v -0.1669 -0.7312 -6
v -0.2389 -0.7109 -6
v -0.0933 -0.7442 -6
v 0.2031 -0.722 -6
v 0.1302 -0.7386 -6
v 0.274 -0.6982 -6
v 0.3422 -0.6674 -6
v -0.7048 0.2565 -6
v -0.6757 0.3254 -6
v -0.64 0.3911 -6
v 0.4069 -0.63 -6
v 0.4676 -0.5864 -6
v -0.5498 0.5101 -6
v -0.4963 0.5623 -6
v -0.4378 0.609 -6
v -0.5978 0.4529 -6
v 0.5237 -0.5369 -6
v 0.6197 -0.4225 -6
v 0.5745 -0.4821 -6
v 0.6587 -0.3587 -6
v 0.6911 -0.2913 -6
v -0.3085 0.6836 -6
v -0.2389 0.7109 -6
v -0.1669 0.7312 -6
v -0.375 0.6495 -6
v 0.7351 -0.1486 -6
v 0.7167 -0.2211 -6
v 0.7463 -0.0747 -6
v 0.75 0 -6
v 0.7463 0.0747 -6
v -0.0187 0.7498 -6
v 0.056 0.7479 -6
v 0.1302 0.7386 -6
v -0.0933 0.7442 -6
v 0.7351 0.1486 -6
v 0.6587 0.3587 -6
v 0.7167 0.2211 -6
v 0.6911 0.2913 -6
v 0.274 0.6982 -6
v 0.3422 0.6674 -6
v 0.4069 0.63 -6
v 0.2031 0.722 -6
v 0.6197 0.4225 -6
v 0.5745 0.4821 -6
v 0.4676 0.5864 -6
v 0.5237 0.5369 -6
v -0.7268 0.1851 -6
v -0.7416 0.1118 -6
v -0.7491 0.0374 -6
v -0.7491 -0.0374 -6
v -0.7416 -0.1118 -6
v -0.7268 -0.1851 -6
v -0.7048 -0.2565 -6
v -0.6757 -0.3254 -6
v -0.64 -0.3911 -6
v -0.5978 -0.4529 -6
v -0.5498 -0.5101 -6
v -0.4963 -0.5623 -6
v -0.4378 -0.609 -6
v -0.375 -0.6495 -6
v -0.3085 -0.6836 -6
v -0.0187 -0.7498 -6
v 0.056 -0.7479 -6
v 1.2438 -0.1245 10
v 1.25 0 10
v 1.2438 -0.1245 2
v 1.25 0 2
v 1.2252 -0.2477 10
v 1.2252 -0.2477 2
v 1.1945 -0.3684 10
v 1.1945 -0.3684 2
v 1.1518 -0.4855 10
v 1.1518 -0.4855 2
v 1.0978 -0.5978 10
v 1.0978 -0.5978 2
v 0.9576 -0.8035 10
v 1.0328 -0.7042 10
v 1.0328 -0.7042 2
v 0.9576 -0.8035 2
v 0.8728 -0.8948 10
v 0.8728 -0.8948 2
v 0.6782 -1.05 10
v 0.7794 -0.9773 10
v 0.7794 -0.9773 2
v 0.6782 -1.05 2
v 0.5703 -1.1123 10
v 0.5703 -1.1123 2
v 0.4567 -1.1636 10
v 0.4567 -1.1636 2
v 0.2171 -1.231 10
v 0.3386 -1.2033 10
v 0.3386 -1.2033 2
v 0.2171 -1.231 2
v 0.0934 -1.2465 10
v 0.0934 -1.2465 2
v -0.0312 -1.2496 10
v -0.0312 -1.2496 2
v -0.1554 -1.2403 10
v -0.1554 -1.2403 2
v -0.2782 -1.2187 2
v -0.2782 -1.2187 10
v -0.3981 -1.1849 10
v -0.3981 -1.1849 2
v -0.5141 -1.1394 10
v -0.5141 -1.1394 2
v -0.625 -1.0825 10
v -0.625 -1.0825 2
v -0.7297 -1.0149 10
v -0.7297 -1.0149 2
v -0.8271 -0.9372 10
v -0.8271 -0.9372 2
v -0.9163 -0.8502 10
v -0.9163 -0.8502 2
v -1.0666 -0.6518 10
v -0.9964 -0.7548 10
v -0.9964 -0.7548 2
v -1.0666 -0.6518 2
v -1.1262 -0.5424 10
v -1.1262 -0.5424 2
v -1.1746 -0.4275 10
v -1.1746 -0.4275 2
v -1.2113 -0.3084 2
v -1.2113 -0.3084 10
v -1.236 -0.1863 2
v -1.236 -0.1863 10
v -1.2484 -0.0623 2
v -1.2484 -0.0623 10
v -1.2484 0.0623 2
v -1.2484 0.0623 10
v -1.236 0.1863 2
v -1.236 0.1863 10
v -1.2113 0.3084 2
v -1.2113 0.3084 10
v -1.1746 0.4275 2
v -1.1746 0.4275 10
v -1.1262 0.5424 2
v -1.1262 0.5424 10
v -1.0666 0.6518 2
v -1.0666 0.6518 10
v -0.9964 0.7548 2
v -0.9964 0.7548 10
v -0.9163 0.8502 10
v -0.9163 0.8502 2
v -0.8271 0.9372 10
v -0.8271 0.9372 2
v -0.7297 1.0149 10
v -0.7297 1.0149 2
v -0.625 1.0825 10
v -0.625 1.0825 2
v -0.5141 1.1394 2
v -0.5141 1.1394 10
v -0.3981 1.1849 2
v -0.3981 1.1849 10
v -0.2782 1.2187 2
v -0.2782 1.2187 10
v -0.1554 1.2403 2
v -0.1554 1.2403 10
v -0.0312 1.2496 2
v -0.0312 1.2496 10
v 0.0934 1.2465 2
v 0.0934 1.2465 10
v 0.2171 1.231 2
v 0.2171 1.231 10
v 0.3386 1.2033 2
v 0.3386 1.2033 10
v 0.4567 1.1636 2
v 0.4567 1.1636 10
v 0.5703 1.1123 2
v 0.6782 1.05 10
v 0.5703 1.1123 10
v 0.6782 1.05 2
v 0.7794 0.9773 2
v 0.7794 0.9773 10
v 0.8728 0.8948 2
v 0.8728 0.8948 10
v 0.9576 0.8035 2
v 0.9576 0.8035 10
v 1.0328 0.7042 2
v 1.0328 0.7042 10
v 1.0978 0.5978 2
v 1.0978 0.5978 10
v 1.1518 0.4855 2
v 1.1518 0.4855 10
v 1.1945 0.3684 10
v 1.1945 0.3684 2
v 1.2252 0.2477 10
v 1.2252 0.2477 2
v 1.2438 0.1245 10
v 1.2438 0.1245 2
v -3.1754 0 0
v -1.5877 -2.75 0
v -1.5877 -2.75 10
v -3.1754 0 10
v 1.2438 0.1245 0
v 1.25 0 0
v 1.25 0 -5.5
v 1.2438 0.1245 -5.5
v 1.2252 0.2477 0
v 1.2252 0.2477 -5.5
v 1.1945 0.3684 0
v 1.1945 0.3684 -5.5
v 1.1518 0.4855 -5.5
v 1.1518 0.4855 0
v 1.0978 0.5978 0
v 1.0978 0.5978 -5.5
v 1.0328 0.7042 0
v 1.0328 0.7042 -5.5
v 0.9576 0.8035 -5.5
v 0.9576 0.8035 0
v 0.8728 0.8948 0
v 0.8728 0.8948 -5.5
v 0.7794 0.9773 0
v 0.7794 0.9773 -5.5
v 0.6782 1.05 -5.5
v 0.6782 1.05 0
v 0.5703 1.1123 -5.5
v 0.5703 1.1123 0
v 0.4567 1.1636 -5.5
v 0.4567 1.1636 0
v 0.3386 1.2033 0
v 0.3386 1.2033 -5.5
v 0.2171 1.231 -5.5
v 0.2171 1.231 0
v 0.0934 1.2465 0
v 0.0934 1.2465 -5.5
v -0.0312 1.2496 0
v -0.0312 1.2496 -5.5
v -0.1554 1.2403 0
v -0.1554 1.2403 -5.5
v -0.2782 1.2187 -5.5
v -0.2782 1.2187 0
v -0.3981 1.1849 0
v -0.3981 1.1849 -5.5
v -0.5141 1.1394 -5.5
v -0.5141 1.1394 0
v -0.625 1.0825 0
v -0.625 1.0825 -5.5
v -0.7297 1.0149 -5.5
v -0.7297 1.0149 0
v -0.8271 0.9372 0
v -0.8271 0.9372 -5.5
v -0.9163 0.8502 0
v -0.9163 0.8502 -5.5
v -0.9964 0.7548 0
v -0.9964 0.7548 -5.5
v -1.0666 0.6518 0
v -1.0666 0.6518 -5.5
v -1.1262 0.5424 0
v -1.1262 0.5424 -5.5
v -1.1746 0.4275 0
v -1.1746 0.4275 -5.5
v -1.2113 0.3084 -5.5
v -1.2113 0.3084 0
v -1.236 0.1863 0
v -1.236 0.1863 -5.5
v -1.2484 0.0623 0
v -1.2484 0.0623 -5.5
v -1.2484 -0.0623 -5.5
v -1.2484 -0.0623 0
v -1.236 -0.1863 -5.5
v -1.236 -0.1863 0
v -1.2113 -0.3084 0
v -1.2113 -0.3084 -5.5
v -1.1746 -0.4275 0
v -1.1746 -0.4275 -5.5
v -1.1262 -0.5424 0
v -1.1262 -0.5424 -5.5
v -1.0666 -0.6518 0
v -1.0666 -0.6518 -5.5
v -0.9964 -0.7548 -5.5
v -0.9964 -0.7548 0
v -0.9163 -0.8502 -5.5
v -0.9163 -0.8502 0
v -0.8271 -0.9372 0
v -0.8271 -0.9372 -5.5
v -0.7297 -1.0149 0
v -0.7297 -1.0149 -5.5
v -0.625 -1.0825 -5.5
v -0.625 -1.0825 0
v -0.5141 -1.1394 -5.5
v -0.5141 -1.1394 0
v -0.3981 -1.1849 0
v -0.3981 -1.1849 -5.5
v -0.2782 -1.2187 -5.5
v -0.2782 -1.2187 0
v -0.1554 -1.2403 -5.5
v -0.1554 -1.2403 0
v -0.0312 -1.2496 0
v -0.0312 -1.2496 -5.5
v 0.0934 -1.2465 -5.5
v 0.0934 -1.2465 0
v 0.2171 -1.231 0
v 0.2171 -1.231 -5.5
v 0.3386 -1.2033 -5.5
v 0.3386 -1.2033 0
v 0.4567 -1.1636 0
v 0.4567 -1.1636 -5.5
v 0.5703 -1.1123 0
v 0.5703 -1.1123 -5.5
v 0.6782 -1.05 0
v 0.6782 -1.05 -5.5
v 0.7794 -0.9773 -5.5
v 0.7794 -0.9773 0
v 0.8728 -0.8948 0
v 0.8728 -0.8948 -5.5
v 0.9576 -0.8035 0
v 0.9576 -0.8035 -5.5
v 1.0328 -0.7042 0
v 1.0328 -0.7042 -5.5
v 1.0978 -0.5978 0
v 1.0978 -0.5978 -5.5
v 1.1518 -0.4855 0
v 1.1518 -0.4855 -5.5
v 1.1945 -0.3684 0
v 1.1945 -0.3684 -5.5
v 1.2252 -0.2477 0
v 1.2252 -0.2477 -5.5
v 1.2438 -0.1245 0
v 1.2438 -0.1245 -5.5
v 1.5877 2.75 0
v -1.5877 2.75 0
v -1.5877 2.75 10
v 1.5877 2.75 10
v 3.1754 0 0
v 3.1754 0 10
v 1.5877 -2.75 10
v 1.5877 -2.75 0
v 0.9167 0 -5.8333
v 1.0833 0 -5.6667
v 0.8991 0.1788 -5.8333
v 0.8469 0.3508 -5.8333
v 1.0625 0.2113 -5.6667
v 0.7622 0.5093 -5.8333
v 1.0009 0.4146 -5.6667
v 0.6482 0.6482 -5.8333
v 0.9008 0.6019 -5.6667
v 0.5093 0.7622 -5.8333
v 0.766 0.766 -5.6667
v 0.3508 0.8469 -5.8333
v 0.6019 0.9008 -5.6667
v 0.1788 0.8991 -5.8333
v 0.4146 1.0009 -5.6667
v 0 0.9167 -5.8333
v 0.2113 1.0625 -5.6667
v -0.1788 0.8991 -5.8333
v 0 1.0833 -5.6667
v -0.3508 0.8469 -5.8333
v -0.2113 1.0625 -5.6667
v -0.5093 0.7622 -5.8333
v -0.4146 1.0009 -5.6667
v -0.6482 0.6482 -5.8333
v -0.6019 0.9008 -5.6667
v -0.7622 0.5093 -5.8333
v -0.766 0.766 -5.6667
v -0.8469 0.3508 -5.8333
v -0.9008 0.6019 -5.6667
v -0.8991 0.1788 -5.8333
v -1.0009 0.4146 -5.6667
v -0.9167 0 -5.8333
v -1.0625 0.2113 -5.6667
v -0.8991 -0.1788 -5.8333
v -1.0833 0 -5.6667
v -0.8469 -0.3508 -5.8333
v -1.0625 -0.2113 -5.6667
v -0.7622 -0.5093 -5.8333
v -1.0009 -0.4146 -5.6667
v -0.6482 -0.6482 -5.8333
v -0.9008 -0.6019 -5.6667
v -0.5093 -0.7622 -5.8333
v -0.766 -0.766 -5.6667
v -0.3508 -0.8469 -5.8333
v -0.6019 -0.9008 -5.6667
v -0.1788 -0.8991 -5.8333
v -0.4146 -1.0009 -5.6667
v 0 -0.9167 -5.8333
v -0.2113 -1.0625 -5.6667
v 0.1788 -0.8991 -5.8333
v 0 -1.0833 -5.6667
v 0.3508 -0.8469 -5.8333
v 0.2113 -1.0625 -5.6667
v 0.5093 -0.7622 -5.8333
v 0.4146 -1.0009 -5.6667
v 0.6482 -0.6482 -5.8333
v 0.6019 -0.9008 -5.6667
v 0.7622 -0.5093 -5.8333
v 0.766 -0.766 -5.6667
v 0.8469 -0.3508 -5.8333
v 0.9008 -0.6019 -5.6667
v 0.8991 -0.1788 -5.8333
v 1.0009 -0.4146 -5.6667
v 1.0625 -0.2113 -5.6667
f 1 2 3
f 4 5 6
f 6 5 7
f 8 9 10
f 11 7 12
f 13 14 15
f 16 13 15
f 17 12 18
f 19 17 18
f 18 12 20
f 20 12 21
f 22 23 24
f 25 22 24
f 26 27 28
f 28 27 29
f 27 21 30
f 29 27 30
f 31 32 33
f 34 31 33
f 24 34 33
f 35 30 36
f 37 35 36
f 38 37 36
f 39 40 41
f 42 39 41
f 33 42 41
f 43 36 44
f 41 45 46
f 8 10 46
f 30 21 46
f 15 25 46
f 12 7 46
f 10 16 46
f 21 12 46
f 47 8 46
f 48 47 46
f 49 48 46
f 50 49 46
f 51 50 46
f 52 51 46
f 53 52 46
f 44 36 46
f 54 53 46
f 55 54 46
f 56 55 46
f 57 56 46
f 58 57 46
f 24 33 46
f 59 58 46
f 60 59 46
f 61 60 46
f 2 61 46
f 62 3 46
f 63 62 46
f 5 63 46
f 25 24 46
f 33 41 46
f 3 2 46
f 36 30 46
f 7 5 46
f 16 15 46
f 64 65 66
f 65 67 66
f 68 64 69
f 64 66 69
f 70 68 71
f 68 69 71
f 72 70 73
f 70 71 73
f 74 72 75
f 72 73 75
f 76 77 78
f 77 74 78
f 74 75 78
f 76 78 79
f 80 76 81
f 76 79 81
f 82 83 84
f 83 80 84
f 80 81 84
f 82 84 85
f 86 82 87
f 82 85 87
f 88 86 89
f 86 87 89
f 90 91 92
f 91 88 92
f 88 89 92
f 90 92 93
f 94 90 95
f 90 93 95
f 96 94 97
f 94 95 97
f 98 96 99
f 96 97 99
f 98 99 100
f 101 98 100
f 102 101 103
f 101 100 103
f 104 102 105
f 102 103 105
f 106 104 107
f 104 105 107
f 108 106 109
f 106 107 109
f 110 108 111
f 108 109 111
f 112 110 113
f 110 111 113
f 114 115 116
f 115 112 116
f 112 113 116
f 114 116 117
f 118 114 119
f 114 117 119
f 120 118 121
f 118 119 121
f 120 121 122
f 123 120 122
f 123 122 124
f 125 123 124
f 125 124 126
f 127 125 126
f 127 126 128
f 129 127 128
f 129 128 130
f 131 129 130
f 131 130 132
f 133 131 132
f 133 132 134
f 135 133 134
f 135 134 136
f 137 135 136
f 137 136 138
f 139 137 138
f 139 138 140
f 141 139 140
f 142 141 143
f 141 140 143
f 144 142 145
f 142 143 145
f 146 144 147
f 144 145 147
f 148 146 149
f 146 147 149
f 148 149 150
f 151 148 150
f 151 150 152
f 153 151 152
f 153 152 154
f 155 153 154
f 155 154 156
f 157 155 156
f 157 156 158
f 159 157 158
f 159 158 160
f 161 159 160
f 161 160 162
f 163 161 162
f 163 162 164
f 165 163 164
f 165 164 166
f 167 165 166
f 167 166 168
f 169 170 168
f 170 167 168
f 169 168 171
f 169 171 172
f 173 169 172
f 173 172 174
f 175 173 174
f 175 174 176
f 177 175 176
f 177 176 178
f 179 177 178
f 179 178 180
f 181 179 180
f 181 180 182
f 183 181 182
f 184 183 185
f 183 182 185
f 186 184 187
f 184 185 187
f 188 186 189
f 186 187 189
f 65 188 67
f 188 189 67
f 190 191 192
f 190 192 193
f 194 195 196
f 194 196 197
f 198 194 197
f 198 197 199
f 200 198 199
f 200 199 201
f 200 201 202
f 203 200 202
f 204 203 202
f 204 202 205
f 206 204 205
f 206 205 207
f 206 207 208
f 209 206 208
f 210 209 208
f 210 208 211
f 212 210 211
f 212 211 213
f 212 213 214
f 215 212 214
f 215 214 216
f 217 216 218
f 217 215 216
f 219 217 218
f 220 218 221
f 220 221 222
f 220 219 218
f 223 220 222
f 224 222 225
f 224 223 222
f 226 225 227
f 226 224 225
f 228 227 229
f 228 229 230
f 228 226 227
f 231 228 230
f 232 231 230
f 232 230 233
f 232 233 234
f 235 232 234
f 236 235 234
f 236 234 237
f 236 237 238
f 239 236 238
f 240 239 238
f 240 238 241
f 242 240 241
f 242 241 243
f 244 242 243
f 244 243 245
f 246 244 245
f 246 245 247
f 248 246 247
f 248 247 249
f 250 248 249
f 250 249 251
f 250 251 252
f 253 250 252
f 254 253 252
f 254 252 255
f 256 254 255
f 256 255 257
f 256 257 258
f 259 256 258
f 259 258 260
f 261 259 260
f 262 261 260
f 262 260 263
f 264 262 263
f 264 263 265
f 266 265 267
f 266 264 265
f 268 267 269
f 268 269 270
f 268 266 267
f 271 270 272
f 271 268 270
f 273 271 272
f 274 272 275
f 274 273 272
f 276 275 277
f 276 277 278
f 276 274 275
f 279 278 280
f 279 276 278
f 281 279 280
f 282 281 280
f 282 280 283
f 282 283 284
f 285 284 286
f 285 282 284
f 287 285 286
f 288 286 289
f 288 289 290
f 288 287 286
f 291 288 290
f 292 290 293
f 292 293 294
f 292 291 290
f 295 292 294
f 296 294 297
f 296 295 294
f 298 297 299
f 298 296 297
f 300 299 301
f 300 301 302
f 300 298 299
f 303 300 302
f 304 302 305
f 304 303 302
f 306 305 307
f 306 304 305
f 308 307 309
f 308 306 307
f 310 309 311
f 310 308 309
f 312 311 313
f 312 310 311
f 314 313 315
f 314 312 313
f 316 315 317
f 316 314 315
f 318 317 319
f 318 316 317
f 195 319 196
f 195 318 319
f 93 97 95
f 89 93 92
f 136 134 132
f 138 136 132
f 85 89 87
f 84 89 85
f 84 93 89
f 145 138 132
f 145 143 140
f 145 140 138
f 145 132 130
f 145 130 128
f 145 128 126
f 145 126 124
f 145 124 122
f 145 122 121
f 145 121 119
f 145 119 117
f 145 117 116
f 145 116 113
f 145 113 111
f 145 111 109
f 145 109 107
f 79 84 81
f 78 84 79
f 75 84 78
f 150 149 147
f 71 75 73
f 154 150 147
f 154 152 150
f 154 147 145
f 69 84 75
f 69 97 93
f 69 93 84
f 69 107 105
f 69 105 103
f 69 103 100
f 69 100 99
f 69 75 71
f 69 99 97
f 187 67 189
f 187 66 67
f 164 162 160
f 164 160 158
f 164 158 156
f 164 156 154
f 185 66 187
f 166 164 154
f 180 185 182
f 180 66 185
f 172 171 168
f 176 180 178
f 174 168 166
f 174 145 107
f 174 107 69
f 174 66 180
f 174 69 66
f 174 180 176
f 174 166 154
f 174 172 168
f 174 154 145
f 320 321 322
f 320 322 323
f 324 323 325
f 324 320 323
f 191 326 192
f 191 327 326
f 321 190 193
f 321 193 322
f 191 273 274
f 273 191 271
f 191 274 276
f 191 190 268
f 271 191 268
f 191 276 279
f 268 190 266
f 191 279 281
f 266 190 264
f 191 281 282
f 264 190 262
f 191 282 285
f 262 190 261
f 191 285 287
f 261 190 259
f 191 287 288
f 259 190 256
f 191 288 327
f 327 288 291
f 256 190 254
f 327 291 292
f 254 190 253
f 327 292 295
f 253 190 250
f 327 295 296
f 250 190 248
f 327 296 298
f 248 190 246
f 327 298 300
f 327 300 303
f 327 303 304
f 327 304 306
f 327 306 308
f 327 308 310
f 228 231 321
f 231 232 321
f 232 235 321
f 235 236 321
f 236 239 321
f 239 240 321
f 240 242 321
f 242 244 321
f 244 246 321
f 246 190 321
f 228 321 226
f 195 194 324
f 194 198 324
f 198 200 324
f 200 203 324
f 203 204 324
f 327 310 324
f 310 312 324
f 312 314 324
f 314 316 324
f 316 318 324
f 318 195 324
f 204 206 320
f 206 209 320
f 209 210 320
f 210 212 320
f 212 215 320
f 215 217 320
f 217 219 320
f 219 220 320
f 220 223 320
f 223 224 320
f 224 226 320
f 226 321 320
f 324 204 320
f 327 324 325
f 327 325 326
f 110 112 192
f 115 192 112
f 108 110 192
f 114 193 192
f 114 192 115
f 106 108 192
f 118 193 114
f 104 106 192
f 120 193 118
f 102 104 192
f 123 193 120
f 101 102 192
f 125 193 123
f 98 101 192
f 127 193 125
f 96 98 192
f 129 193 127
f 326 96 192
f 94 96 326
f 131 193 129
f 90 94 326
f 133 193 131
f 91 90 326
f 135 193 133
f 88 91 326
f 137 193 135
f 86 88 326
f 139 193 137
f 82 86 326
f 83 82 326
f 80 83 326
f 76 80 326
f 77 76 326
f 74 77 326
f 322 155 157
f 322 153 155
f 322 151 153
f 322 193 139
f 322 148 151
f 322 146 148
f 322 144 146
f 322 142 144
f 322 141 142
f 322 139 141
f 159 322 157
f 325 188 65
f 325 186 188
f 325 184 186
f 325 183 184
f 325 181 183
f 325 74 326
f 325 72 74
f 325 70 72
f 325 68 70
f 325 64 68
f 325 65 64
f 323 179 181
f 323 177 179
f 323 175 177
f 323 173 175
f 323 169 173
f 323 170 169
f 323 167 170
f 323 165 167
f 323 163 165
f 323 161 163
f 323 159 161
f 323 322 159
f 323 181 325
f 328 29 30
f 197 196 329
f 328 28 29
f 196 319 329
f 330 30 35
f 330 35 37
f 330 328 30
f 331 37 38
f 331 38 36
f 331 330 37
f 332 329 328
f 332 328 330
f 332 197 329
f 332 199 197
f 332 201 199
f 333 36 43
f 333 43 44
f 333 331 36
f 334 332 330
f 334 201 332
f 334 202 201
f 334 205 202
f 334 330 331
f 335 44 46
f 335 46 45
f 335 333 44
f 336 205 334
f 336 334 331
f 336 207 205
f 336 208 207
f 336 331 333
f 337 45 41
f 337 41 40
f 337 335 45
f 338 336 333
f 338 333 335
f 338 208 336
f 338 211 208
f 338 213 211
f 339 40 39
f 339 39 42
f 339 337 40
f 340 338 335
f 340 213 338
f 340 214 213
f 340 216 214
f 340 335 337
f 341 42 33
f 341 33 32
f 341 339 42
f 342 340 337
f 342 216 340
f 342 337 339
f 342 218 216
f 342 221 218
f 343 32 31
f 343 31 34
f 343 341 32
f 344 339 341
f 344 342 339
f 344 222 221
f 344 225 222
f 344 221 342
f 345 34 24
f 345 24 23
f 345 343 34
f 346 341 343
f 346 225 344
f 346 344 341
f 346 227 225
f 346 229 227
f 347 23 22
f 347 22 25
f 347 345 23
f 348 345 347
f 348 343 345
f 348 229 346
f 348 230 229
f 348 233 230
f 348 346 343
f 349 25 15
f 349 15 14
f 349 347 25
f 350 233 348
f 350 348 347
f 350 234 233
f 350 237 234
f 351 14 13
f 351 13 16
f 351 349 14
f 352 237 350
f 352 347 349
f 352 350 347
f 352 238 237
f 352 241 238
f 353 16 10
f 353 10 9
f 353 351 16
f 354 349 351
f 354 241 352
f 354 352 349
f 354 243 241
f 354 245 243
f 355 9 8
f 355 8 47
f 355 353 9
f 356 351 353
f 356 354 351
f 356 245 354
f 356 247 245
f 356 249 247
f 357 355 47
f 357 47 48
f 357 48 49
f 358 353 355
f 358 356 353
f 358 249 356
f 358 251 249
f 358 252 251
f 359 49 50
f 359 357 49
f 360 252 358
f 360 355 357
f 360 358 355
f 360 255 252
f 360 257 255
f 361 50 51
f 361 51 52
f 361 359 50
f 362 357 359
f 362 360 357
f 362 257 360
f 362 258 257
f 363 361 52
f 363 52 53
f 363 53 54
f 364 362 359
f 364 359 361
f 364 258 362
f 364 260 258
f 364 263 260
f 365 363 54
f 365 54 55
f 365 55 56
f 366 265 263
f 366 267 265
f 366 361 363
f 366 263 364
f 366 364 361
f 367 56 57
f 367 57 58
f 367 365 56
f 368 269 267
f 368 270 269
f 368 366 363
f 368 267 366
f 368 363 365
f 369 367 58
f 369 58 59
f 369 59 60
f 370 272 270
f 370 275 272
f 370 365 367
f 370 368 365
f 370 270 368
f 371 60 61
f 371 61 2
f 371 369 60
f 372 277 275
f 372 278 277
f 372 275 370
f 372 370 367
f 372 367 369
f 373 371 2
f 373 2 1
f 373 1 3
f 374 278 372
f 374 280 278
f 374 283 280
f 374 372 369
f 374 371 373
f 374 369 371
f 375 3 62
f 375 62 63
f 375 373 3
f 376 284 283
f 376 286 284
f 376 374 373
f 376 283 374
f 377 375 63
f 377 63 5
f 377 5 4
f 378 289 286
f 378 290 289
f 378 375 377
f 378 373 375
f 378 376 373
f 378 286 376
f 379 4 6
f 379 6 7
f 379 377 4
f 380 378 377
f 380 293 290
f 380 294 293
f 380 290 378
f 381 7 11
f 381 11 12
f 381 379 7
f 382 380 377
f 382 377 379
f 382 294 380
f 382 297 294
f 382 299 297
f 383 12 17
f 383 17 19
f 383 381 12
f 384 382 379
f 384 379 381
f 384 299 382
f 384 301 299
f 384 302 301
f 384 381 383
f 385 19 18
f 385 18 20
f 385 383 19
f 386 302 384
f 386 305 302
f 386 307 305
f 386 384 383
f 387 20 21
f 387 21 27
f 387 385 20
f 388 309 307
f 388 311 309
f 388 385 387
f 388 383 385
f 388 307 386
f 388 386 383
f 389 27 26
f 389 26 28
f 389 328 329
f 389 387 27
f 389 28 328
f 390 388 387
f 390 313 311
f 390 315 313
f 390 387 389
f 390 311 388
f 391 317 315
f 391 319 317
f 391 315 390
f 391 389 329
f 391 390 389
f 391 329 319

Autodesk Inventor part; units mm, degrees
ref_plane "YZ Plane" through (0, 0, 0) normal (1, 0, 0) x (0, 1, 0)
ref_plane "XZ Plane" through (0, 0, 0) normal (0, 1, 0) x (-1, 0, 0)
ref_plane "XY Plane" through (0, 0, 0) normal (0, 0, 1) x (1, 0, 0)
sketch "Skizze1" plane through (0, 0, 0) normal (0, 0, 1) x (1, 0, 0)
  line L0 (1.5877, 2.75) -> (3.1754, 0)
  line L1 (3.1754, 0) -> (1.5877, -2.75)
  line L2 (1.5877, -2.75) -> (-1.5877, -2.75)
  line L3 (-1.5877, -2.75) -> (-3.1754, 0)
  line L4 (-3.1754, 0) -> (-1.5877, 2.75)
  line L5 (-1.5877, 2.75) -> (1.5877, 2.75)
  circle A0 centre (0, 0) radius 1.25
  circle A1 centre (0, 0) radius 1.5
  point P0 (0, -2.75)
  dimension "d0" = 5.5
  dimension "d1" = 2.5
  dimension "d2" = 3
extrude "Extrusion1" add sketch "Skizze1" along normal blind 10 contours L0 L1 L2 L3 L4 L5 | A1
extrude "Extrusion2" add sketch "Skizze1" along normal blind 2 contours A0
extrude "Extrusion3" add sketch "Skizze1" against normal blind 6 contours A0
chamfer "Fase1" distance 0.5 angle 45 1 edges at (-1.25, 0, -6)
properties part number "M3x10x6 Standoff" material "Edelstahl"
